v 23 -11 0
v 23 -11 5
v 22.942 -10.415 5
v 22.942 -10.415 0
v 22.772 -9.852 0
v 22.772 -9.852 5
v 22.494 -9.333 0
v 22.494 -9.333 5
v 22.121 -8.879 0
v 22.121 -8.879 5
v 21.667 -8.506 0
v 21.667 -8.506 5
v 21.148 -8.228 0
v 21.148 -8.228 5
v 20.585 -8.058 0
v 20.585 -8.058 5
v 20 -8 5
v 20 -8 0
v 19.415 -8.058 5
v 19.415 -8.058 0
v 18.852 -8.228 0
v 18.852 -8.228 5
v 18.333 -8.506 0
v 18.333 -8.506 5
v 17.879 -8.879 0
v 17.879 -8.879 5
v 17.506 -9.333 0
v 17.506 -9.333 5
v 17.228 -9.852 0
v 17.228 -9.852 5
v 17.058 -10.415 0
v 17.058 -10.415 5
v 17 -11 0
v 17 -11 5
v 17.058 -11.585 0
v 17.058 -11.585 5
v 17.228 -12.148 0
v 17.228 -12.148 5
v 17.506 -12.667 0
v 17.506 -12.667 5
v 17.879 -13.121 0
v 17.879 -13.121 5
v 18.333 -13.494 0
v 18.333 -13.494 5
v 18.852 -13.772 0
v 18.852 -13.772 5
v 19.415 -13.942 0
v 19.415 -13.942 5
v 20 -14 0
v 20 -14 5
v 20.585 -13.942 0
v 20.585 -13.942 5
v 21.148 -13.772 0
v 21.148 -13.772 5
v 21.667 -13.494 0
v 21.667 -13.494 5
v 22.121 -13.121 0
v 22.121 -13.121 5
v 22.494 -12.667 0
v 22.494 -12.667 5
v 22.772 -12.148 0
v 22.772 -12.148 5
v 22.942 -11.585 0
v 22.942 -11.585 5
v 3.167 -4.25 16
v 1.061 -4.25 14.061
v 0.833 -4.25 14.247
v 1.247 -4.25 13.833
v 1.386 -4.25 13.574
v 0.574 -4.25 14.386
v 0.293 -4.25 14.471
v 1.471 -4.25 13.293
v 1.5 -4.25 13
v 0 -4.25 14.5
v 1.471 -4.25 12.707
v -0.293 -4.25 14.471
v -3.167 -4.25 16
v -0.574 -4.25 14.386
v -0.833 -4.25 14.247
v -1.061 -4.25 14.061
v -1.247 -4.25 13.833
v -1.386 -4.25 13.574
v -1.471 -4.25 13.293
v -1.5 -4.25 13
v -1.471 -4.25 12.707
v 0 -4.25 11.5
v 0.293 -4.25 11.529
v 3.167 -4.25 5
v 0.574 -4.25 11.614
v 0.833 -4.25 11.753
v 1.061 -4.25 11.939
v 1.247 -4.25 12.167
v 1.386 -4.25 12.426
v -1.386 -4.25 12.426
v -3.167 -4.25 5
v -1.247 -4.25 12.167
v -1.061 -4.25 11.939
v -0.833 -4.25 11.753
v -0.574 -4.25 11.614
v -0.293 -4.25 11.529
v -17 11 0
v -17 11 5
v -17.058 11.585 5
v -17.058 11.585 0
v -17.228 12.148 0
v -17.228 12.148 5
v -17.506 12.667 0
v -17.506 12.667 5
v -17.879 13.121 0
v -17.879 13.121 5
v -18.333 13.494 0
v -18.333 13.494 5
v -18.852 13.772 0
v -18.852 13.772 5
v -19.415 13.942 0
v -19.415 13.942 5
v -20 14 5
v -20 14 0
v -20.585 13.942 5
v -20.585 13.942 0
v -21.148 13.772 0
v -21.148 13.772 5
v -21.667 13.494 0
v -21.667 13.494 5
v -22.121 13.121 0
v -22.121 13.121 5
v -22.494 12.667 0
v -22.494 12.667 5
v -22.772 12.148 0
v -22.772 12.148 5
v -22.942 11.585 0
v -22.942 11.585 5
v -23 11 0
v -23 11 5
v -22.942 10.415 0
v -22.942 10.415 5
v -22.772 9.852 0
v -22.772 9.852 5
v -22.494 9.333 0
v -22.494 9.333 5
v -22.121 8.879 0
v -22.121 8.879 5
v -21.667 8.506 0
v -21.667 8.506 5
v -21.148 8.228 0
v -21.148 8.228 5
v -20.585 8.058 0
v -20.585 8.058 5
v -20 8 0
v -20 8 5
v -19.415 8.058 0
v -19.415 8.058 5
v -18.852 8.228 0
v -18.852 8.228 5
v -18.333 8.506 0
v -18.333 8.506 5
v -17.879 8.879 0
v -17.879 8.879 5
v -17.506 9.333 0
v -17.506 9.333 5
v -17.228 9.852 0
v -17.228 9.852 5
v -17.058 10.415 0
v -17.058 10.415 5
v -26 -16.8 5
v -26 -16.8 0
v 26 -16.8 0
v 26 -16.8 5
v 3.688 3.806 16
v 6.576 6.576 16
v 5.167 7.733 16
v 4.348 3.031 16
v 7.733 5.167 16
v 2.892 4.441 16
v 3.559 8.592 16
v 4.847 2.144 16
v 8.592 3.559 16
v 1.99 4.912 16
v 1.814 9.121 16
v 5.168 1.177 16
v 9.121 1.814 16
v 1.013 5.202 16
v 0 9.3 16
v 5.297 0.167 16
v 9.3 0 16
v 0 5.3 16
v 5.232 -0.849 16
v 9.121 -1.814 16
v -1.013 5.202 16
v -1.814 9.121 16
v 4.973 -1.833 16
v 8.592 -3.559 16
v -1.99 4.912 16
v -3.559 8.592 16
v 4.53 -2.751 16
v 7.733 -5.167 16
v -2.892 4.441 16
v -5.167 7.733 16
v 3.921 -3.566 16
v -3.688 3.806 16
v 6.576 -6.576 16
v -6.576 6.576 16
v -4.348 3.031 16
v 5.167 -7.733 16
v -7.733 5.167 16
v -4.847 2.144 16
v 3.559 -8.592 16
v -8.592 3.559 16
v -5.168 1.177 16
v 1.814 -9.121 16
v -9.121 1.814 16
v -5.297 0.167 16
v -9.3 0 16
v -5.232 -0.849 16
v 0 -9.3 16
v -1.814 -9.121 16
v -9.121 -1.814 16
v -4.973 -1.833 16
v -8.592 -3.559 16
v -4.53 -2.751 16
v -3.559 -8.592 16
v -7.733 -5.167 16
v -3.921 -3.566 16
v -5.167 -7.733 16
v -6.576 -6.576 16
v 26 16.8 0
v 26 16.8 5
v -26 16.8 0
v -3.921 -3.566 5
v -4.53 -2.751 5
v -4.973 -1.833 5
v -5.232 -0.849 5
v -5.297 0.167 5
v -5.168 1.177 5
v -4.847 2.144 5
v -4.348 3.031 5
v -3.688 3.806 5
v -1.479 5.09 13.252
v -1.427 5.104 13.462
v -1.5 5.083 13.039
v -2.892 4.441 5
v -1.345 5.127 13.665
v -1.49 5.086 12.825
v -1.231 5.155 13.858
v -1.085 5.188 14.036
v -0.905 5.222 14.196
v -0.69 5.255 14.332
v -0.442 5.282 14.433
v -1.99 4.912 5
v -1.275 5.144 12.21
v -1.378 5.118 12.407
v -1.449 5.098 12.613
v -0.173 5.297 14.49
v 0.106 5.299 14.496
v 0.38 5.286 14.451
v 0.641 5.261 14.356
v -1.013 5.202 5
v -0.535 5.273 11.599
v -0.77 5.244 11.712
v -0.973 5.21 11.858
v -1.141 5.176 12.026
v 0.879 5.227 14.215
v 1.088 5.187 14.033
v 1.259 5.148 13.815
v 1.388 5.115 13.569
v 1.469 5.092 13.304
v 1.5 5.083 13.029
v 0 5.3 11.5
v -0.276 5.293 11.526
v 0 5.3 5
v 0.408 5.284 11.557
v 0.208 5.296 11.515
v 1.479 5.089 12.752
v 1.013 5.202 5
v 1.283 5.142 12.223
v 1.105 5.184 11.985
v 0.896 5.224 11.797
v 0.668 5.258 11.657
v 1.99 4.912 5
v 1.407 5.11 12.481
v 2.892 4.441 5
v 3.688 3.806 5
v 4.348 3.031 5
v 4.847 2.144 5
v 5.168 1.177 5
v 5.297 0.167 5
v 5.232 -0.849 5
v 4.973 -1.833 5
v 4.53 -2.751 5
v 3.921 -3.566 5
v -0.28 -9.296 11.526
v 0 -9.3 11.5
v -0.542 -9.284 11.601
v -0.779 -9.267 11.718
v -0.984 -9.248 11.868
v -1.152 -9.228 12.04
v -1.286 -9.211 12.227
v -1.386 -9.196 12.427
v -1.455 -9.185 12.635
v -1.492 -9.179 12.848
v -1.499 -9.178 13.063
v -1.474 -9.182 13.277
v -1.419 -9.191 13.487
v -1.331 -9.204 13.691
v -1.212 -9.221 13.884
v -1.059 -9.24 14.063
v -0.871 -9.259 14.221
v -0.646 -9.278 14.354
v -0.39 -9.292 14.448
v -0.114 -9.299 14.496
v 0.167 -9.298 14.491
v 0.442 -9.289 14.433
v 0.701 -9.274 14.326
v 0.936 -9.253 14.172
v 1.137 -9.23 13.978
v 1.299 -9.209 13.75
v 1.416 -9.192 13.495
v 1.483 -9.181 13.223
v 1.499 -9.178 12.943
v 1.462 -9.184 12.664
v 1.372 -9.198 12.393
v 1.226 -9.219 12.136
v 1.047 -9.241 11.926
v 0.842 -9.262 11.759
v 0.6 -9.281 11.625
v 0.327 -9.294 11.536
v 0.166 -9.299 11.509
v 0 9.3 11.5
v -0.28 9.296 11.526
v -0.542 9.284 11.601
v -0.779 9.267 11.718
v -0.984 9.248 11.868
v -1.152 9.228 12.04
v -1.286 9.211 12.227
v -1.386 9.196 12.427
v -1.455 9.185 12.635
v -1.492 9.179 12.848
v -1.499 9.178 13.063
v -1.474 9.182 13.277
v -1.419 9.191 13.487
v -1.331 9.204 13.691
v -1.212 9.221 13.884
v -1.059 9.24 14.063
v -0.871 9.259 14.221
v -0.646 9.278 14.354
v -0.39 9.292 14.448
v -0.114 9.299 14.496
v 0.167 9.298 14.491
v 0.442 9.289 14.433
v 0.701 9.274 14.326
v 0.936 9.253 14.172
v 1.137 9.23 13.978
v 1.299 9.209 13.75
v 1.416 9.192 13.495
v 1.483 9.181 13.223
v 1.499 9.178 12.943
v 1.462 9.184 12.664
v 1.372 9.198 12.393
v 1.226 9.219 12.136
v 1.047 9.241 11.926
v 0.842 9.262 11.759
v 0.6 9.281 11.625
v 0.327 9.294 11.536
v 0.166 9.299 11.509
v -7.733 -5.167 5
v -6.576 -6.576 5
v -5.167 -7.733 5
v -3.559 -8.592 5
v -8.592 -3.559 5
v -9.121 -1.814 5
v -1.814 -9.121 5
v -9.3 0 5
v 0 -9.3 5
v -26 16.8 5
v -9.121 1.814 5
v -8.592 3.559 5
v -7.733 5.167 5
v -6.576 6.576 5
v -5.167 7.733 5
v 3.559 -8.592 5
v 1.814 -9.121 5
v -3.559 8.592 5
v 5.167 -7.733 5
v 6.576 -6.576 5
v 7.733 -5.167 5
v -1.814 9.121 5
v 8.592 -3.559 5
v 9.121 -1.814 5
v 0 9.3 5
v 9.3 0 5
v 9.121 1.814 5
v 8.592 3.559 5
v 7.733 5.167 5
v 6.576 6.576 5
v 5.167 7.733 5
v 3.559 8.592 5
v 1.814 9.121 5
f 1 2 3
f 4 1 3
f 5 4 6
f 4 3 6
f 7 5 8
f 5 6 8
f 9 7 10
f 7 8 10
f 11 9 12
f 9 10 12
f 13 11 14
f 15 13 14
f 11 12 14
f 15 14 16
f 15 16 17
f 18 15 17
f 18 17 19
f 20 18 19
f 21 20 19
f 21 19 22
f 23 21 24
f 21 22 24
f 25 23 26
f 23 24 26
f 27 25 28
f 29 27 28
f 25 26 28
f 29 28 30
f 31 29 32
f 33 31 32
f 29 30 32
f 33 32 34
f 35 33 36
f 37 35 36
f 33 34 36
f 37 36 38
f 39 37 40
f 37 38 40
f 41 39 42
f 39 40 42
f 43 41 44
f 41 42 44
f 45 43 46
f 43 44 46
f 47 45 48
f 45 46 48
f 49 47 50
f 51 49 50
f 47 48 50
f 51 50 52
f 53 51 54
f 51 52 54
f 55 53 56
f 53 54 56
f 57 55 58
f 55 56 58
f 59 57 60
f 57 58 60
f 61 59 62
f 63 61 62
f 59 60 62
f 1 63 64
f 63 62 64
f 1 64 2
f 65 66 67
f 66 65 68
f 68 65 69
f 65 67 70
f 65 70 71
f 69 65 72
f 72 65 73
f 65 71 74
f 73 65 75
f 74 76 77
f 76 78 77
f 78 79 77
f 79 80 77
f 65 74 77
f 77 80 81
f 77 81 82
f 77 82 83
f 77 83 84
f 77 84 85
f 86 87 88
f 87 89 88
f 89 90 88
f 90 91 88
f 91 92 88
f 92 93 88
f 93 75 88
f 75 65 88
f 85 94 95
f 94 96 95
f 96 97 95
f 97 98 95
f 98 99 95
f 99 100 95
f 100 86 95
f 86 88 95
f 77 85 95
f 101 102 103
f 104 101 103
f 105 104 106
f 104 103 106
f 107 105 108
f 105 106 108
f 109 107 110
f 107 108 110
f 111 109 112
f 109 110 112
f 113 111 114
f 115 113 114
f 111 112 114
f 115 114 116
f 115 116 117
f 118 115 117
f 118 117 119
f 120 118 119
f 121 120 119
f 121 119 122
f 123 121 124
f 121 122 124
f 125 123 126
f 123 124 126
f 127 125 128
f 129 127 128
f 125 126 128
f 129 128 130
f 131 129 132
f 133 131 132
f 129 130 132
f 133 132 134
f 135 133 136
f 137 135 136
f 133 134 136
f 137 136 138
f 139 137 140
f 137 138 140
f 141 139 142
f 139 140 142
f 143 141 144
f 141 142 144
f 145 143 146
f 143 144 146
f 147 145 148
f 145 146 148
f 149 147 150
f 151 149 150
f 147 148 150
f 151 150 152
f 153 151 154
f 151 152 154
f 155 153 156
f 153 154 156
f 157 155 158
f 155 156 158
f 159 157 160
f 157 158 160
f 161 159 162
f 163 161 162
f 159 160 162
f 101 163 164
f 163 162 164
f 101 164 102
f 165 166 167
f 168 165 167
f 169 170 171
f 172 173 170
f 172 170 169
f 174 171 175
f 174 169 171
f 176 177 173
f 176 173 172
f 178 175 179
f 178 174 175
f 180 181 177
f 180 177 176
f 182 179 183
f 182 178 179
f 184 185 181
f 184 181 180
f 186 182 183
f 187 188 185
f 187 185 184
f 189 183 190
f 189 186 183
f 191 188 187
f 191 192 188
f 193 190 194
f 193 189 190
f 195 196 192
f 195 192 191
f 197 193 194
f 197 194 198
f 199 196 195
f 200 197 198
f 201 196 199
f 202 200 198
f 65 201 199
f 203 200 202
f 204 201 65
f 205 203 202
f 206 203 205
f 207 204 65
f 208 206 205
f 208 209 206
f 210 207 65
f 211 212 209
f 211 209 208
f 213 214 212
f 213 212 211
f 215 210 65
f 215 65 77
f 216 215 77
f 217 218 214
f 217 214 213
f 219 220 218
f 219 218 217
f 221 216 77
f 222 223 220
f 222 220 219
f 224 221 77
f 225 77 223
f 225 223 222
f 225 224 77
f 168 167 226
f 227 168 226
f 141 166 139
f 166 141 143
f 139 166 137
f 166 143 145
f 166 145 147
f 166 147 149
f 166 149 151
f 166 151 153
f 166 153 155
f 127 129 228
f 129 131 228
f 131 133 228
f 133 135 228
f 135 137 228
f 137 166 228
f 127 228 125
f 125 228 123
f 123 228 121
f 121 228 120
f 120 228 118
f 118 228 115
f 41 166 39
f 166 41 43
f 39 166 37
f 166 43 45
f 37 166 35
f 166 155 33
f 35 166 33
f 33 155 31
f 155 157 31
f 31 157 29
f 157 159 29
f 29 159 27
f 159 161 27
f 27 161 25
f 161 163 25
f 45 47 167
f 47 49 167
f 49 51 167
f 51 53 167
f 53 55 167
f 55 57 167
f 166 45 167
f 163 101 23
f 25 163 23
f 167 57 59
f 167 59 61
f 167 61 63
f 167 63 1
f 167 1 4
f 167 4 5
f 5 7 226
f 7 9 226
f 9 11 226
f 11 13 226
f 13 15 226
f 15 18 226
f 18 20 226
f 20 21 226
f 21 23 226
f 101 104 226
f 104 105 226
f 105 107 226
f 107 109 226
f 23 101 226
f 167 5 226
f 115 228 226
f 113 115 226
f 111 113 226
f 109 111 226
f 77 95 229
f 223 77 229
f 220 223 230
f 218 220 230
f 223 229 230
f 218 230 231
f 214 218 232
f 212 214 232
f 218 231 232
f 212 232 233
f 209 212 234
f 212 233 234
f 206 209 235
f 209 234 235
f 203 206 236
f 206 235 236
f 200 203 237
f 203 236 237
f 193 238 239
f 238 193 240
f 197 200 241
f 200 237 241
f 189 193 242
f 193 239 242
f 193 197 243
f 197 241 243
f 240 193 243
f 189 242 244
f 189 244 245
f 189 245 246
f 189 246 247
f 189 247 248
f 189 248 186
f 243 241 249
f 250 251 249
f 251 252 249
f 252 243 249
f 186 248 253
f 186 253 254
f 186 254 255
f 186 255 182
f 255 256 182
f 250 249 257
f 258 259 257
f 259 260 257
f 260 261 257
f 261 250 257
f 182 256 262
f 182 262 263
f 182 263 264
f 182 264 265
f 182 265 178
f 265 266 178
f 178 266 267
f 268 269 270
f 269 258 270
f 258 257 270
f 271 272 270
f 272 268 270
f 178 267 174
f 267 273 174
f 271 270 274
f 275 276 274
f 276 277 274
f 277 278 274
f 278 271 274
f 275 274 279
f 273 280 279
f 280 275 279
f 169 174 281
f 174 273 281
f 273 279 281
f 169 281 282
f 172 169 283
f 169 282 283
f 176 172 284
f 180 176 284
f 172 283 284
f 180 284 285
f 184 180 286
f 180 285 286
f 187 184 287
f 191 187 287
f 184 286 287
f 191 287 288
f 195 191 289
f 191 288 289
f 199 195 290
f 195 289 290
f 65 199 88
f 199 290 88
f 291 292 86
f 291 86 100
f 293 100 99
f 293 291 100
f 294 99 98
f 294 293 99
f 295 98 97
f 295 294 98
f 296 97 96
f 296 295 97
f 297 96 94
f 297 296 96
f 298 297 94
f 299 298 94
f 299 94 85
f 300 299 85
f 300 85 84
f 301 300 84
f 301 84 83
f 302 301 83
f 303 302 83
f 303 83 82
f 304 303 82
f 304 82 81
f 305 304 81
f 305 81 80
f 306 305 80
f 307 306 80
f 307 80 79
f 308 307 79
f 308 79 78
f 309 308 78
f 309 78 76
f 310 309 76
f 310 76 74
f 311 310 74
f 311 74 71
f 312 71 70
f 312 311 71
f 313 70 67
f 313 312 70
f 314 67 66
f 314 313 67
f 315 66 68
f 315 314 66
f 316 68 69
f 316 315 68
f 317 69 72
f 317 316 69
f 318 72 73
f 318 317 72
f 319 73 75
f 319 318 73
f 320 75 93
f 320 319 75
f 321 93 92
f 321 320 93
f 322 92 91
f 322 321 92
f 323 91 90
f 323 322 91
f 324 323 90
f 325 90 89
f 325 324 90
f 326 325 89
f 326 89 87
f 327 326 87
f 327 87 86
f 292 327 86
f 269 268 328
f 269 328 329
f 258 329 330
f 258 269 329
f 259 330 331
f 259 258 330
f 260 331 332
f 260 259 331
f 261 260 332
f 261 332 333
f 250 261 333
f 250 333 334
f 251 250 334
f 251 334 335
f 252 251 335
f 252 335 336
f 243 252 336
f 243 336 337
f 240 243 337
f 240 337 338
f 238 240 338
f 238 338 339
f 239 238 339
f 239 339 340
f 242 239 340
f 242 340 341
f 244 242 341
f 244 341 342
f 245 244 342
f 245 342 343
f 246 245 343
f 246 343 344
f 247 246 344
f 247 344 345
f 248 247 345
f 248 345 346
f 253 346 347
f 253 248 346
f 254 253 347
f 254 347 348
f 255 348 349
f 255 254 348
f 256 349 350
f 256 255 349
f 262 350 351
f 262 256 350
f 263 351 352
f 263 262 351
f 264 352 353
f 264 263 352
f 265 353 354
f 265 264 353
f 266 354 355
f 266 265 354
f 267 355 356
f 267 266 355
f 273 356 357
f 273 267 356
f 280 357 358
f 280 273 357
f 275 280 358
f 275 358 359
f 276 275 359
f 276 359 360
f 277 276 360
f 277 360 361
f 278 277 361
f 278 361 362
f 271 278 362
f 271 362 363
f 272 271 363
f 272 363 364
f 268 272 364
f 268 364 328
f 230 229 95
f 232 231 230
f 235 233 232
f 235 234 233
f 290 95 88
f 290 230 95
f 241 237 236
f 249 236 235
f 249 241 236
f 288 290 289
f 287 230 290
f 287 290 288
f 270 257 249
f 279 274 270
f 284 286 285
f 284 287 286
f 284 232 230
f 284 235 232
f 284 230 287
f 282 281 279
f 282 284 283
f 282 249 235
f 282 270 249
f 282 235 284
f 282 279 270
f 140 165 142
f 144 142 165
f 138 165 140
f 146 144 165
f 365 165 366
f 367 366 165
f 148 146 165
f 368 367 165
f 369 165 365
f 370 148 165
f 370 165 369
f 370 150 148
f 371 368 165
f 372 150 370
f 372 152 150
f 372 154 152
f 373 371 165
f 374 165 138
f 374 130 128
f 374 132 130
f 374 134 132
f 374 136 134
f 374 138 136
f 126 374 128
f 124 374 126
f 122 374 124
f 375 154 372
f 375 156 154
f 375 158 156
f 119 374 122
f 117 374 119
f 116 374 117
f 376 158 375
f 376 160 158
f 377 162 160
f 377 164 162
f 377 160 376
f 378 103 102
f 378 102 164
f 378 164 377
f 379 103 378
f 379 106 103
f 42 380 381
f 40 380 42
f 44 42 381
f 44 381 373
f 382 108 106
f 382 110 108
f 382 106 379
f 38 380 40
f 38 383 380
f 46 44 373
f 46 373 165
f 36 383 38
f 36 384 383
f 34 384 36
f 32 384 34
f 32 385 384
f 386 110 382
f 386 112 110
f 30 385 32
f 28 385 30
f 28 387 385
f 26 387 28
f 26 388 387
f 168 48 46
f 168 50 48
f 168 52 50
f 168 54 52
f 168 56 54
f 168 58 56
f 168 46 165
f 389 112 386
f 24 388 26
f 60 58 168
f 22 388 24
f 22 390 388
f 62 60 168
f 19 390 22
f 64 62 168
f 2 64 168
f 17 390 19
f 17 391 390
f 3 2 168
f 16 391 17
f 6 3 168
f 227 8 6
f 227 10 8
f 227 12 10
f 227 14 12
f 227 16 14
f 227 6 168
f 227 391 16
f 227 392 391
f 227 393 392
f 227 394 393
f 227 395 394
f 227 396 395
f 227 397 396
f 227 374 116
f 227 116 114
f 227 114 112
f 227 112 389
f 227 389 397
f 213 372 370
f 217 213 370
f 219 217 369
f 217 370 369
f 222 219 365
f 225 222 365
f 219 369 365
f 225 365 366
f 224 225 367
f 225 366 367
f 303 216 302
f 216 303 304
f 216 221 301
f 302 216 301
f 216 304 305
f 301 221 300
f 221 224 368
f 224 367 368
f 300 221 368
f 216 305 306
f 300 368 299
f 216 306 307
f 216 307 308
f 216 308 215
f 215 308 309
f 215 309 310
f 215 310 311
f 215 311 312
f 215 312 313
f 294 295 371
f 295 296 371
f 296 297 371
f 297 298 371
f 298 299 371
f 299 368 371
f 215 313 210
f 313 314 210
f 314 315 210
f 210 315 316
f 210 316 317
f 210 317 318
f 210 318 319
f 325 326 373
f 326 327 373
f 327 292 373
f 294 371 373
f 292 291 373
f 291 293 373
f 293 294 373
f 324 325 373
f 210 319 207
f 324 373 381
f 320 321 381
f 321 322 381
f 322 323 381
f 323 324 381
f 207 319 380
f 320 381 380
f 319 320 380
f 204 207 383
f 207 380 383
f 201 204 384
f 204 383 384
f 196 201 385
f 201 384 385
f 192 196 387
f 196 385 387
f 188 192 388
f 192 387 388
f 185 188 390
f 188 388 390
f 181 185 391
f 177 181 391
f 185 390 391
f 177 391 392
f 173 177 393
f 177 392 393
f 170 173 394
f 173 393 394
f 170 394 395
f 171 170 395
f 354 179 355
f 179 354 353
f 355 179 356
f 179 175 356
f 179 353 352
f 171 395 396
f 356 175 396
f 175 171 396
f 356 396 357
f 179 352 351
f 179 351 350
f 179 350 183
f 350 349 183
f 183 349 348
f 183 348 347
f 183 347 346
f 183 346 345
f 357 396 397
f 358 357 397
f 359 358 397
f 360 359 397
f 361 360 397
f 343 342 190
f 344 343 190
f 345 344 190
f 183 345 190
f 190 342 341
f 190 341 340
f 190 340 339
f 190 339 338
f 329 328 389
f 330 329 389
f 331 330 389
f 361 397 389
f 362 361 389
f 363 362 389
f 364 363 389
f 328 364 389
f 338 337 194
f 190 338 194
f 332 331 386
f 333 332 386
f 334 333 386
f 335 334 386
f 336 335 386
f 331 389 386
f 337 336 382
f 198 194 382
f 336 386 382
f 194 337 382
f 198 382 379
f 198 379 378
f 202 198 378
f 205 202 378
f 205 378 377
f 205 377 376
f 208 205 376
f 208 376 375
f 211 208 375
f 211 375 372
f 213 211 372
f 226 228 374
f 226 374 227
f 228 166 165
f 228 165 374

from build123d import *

# Parameters (mm, degrees)
SKETCH_1_W               = 52
SKETCH_1_H               = 33.6
EXTRUDE_1_DEPTH          = 5
SKETCH_3_R               = 3
CUT_EXTRUDE_2_DEPTH      = 5
SKETCH_4_R               = 9.3
EXTRUDE_2_DEPTH          = 11
CUT_EXTRUDE_3_DEPTH      = 11
CUT_EXTRUDE_3_DEPTH_BACK = 11
SKETCH_5_R               = 1.5


with BuildPart() as part:
    # 草图1 → 凸台-拉伸1 (new body)
    with BuildSketch(Plane.XY):
        Rectangle(SKETCH_1_W, SKETCH_1_H)
    extrude(amount=EXTRUDE_1_DEPTH)

    # 草图3 → 切除-拉伸2 (cut)
    with BuildSketch(Plane.XY.offset(5)):
        with Locations((-20, 11)):
            Circle(SKETCH_3_R)
        with Locations((20, -11)):
            Circle(SKETCH_3_R)
    extrude(amount=-CUT_EXTRUDE_2_DEPTH, mode=Mode.SUBTRACT)

    # 草图4 → 凸台-拉伸2 (add)
    with BuildSketch(Plane.XY.offset(5)):
        with Locations(Location((0, 0, 0), (0, 0, 180))):
            Circle(SKETCH_4_R)
        with BuildLine():
            Line((3.166622807, -4.25), (-3.166622807, -4.25))
            ThreePointArc((-3.166622807, -4.25), (0, 5.3), (3.166622807, -4.25))
        make_face(mode=Mode.SUBTRACT)
    extrude(amount=EXTRUDE_2_DEPTH)

    # 草图5 → 切除-拉伸3 (cut, two sides: drawn at the far end of the back side and taken through both)
    with BuildSketch(Plane(origin=(0, 0, 0), x_dir=(1, 0, 0), z_dir=(0, 1, 0)).offset(-CUT_EXTRUDE_3_DEPTH_BACK)):
        with Locations(Location((0, -13, 0), (0, 0, 90))):
            Circle(SKETCH_5_R)
    extrude(amount=CUT_EXTRUDE_3_DEPTH + CUT_EXTRUDE_3_DEPTH_BACK, mode=Mode.SUBTRACT)


solid = part.part
